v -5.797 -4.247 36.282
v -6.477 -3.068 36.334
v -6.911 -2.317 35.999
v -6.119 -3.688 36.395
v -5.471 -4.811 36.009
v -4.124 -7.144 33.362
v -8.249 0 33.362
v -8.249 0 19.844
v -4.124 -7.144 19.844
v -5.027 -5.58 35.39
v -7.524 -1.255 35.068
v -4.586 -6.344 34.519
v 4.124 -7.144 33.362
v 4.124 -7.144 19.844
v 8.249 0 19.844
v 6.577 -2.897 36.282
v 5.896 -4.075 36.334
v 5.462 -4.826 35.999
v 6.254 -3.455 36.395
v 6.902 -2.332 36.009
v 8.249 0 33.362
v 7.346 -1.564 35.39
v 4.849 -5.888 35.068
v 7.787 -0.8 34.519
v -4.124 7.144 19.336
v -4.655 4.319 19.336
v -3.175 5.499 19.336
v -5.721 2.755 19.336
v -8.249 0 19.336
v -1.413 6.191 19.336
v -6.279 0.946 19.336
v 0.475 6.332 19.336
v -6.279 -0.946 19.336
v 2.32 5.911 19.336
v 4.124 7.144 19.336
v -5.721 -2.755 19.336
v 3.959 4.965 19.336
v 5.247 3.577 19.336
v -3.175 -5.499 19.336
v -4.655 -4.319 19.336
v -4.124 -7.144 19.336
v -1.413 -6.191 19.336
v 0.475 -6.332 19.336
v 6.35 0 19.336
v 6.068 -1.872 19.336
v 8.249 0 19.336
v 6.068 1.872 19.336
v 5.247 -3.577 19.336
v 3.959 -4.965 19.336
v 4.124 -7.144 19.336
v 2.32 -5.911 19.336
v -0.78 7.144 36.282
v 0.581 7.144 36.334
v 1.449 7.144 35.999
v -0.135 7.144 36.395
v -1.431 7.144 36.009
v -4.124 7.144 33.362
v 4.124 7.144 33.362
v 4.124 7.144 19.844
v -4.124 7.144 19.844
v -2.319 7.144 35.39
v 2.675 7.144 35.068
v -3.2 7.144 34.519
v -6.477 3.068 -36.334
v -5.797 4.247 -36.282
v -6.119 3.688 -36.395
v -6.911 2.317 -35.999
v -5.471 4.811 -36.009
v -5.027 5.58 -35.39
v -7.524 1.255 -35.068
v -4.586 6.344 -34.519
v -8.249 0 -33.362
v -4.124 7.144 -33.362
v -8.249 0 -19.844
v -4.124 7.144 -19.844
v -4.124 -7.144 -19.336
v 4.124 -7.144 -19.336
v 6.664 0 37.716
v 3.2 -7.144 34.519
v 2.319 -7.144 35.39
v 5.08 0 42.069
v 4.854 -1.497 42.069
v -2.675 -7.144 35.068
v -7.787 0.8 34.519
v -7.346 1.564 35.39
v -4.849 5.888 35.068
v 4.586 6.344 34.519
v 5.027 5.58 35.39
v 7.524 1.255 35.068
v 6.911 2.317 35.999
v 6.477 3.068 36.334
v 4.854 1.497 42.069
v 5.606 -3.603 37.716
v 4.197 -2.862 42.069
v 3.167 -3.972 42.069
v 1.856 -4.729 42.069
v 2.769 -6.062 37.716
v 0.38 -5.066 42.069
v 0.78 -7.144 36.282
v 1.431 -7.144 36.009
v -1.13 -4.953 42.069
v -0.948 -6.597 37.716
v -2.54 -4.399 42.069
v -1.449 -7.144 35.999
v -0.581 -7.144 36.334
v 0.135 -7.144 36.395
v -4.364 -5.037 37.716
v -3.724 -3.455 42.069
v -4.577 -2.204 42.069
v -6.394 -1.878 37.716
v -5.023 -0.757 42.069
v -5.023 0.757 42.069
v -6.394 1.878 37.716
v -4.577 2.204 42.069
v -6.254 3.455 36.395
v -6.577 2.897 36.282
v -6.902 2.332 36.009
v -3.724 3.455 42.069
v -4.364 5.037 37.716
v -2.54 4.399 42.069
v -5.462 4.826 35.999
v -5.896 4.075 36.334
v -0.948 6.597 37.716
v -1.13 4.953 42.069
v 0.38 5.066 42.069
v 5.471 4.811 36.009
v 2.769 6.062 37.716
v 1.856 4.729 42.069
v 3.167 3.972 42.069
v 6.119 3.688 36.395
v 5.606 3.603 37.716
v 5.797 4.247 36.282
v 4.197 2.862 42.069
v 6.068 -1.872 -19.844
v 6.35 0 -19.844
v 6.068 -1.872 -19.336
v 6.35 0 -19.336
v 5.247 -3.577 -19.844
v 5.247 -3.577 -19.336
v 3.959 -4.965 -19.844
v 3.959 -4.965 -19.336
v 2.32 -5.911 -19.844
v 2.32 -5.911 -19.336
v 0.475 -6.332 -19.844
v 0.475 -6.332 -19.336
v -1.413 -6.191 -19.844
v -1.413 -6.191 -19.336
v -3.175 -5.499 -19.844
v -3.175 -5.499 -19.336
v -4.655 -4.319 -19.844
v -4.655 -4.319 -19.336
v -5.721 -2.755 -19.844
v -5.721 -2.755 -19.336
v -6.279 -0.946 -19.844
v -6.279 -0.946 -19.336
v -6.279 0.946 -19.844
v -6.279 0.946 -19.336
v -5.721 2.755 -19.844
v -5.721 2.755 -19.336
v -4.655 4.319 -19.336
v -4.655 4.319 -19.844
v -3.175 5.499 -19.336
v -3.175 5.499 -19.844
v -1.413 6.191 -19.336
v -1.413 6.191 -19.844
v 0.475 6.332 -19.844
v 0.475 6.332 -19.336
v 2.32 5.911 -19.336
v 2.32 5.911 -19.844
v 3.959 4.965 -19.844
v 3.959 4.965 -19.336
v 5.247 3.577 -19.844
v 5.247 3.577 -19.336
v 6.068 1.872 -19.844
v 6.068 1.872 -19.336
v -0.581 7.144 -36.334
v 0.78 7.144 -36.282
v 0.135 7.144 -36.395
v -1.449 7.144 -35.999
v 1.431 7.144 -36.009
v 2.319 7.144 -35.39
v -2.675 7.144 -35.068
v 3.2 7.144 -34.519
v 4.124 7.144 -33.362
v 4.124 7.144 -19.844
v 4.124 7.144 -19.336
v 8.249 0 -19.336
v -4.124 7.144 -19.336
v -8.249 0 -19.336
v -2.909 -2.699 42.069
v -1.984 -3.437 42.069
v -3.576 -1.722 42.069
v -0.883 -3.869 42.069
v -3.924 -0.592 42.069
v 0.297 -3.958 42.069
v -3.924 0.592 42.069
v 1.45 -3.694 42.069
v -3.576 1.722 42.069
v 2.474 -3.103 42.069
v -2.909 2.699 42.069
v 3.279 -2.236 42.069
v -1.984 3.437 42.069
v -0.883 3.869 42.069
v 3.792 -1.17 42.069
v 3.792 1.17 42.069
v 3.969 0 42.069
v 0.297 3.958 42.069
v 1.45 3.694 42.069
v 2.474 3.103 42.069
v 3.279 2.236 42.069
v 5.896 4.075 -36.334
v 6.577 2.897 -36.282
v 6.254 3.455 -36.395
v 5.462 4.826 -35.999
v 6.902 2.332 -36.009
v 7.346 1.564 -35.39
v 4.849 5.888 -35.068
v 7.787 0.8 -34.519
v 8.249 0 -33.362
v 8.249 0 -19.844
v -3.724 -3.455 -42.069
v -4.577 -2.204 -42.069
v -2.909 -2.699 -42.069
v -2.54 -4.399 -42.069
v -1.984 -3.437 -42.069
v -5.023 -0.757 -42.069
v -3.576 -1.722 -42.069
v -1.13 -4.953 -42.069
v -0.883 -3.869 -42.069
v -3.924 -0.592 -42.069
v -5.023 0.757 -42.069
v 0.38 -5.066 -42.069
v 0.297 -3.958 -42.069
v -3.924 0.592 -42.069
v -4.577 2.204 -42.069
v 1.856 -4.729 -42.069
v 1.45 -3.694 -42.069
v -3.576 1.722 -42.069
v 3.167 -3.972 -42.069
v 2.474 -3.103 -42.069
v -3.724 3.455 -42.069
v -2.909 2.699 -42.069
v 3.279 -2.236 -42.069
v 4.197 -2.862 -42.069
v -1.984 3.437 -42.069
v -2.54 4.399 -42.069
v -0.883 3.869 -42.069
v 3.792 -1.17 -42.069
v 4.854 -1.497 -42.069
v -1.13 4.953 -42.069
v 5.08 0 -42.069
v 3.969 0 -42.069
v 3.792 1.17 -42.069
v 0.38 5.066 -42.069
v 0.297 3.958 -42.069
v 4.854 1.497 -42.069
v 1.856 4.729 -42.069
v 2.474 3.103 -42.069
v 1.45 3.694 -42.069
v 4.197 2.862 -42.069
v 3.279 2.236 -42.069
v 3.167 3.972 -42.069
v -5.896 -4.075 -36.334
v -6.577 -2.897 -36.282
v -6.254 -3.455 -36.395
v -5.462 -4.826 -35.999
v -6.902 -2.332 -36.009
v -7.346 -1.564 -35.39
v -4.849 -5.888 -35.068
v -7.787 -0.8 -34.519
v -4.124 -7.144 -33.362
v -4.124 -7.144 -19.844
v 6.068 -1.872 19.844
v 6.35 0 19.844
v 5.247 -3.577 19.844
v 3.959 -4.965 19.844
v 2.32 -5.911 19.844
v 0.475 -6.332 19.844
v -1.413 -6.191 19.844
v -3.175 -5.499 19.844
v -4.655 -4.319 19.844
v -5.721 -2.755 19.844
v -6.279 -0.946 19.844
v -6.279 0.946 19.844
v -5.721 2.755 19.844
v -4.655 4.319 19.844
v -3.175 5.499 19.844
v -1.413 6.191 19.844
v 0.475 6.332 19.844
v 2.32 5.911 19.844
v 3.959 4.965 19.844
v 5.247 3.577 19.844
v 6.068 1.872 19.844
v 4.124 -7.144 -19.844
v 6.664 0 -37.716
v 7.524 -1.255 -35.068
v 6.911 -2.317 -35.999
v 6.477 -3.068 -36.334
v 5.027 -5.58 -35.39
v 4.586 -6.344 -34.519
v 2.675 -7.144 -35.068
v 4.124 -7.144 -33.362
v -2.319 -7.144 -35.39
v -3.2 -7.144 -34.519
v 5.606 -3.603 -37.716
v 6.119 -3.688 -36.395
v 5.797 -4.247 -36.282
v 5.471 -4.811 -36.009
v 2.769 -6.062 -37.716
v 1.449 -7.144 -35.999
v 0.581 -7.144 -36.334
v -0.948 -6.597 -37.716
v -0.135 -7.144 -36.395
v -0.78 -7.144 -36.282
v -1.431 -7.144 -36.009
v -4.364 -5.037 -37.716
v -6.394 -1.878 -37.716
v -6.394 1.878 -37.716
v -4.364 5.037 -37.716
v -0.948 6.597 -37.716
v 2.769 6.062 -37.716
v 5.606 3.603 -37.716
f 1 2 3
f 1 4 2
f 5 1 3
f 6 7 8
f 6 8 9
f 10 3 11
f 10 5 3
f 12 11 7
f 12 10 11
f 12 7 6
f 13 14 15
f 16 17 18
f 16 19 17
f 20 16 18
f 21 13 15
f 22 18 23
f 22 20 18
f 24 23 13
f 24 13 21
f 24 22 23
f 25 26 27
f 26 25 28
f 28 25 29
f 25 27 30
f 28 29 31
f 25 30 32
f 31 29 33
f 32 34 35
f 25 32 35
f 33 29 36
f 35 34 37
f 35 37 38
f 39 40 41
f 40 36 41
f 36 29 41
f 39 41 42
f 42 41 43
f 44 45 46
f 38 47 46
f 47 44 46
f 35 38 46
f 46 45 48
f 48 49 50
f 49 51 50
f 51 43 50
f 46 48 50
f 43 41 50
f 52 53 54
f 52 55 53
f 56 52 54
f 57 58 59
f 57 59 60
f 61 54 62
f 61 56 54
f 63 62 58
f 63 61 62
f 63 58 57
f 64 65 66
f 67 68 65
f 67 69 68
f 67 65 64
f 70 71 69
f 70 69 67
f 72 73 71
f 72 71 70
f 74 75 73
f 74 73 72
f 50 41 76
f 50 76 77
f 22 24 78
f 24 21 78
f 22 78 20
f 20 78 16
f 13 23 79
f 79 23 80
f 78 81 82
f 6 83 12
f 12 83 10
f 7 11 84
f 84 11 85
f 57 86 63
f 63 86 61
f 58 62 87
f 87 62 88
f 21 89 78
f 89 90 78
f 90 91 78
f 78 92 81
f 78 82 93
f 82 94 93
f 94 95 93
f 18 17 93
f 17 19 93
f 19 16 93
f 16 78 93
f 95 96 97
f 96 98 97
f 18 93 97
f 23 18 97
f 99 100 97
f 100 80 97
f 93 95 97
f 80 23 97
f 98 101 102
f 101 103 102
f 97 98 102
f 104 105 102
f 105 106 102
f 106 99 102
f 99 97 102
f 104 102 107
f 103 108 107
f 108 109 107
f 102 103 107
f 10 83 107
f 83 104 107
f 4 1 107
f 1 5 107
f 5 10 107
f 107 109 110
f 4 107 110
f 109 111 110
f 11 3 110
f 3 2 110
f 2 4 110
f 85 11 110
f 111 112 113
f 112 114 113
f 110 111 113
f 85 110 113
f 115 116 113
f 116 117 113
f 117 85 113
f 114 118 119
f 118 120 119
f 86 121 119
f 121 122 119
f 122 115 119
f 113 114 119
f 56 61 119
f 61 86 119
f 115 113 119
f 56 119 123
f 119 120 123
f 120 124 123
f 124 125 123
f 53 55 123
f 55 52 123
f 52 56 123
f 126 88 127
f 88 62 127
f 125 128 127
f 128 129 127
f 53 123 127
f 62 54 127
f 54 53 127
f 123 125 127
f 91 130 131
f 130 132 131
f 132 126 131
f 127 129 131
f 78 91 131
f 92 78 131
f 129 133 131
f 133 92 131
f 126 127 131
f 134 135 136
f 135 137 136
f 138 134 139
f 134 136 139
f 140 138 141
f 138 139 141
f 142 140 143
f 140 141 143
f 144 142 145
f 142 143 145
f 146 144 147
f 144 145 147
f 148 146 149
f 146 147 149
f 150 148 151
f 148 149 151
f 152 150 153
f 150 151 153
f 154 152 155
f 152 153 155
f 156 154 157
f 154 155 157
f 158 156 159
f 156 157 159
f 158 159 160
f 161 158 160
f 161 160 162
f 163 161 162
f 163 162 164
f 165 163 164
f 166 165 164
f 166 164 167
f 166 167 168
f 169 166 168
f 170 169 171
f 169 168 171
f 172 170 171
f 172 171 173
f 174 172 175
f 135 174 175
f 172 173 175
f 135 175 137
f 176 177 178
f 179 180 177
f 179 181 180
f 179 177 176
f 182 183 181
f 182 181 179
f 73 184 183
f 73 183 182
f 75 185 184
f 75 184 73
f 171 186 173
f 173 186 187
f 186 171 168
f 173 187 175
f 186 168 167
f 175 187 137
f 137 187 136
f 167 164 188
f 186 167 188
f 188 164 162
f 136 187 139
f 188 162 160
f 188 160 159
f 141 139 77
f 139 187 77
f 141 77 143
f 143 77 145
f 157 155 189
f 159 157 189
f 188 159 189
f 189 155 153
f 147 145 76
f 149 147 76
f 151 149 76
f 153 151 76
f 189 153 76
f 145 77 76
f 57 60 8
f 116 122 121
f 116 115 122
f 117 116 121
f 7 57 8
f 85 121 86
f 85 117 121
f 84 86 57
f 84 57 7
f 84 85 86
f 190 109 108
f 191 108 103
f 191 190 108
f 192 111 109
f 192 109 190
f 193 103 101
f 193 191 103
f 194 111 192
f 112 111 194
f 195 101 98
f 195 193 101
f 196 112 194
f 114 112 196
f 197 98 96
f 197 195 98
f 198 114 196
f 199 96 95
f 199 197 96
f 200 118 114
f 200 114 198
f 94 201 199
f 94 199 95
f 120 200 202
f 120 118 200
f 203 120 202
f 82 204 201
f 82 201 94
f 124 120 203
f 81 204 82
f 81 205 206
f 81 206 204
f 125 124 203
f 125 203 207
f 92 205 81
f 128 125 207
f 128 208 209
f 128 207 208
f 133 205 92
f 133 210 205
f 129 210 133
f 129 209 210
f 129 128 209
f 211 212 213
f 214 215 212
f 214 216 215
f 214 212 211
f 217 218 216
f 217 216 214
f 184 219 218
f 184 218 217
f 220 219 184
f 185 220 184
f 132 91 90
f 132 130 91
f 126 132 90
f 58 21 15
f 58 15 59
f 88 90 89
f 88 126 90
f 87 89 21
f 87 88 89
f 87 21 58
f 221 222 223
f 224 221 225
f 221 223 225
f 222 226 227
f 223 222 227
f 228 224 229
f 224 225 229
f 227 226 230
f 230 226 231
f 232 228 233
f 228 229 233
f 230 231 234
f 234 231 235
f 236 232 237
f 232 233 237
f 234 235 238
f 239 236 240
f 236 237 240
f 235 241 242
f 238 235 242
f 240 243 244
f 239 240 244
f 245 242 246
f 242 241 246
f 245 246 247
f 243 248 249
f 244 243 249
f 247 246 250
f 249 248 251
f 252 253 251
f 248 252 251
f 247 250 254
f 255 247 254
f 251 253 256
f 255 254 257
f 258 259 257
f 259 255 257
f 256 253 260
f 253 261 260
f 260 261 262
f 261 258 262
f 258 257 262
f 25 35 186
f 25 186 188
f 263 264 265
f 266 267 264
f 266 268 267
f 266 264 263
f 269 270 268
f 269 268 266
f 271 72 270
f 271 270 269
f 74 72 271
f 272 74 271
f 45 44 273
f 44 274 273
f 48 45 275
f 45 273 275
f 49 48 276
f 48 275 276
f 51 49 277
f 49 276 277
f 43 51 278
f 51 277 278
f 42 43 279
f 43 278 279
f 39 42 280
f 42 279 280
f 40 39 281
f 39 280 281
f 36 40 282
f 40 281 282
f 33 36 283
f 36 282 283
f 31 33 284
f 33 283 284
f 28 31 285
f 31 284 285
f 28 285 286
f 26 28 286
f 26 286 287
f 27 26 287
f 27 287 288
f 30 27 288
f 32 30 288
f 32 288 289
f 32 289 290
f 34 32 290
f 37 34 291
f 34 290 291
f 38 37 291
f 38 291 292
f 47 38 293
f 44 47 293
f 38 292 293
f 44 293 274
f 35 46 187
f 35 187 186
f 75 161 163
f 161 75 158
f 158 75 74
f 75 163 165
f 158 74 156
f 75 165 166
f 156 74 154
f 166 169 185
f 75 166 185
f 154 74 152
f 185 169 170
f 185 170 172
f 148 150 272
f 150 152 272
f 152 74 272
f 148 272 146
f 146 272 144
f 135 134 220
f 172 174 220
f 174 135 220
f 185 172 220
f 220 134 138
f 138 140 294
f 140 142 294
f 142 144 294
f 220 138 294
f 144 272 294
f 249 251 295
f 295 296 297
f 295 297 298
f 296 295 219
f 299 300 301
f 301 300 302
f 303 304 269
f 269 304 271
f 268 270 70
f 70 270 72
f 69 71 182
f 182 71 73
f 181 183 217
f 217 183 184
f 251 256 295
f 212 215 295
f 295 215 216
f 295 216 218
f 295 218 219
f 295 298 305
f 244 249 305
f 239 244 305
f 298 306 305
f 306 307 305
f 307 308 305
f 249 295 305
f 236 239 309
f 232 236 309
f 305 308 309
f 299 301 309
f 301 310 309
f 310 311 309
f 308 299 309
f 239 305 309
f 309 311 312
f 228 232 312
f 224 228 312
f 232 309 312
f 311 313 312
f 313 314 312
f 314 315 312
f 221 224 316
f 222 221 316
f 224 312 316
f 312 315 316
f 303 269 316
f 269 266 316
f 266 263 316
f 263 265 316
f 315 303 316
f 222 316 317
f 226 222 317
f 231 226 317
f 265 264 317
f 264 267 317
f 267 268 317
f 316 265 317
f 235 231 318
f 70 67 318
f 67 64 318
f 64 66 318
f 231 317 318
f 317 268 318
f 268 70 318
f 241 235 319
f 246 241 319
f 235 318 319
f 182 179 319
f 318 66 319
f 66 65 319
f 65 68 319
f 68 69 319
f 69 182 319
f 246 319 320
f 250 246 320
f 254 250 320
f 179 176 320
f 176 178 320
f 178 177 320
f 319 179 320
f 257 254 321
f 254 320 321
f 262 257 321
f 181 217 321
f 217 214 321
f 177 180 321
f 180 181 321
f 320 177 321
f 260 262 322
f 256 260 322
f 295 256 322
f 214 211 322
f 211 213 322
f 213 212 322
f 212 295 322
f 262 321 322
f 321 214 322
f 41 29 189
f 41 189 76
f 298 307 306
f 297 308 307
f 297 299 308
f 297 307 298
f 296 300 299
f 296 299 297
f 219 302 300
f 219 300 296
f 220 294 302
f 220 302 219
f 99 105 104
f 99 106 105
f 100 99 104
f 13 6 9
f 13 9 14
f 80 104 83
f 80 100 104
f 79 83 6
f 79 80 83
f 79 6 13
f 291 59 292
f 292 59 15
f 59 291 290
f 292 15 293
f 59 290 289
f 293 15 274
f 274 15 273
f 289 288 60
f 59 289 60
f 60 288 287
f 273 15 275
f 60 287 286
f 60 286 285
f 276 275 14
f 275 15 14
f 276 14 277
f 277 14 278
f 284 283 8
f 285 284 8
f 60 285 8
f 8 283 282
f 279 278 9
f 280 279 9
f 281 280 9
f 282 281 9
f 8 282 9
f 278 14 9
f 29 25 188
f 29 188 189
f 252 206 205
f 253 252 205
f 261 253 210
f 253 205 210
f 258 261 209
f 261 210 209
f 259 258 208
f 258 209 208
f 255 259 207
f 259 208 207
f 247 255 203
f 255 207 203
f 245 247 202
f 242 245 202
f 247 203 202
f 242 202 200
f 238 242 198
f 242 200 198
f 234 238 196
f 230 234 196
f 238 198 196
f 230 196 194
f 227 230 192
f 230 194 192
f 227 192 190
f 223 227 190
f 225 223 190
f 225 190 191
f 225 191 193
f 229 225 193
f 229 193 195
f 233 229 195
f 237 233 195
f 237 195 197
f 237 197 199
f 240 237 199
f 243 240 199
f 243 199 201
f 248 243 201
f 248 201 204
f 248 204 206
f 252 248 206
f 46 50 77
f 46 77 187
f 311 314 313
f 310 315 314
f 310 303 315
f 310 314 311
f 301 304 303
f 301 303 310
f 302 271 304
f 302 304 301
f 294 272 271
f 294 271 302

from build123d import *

# Parameters (mm, degrees)
BASE_EXTRUDE_DEPTH = 42.06875
SKETCH3_R          = 3.96875
CUT_EXTRUDE1_DEPTH = 85.842184608


with BuildPart() as part:
    # Sketch1 → Base-Extrude (new, symmetric)
    with BuildSketch(Plane.XY):
        Polygon((8.248891971, 0), (4.124445986, 7.14375), (-4.124445986, 7.14375), (-8.248891971, 0), (-4.124445986, -7.14375), (4.124445986, -7.14375), align=None)
    extrude(amount=BASE_EXTRUDE_DEPTH, both=True)

    # Sketch2 → Cut-Revolve1 (revolve, cut)
    with BuildSketch(Plane(origin=(0, 0, 0), x_dir=(0, 0, -1), z_dir=(1, 0, 0)), mode=Mode.PRIVATE) as cut_revolve1_sk:
        Polygon((19.84375, 6.35), (19.33575, 6.35), (19.33575, 8.89), (-19.33575, 8.89), (-19.33575, 6.35), (-19.84375, 6.35), (-19.84375, 8.89), (-31.600861032, 8.89), (-42.06875, 5.08), (-42.06875, 18.081978304), (42.06875, 18.081978304), (42.06875, 5.08), (31.600861032, 8.89), (19.84375, 8.89), align=None)
    revolve(cut_revolve1_sk.sketch.rotate(Axis((0, 0, 64.541972625), (0, 0, -1)), 90), axis=Axis((0, 0, 64.541972625), (0, 0, -1)), mode=Mode.SUBTRACT)

    # Sketch3 → Cut-Extrude1 (cut, through all)
    with BuildSketch(Plane.XY.offset(42.06875)):
        Circle(SKETCH3_R)
    extrude(amount=-CUT_EXTRUDE1_DEPTH, mode=Mode.SUBTRACT)


solid = part.part
